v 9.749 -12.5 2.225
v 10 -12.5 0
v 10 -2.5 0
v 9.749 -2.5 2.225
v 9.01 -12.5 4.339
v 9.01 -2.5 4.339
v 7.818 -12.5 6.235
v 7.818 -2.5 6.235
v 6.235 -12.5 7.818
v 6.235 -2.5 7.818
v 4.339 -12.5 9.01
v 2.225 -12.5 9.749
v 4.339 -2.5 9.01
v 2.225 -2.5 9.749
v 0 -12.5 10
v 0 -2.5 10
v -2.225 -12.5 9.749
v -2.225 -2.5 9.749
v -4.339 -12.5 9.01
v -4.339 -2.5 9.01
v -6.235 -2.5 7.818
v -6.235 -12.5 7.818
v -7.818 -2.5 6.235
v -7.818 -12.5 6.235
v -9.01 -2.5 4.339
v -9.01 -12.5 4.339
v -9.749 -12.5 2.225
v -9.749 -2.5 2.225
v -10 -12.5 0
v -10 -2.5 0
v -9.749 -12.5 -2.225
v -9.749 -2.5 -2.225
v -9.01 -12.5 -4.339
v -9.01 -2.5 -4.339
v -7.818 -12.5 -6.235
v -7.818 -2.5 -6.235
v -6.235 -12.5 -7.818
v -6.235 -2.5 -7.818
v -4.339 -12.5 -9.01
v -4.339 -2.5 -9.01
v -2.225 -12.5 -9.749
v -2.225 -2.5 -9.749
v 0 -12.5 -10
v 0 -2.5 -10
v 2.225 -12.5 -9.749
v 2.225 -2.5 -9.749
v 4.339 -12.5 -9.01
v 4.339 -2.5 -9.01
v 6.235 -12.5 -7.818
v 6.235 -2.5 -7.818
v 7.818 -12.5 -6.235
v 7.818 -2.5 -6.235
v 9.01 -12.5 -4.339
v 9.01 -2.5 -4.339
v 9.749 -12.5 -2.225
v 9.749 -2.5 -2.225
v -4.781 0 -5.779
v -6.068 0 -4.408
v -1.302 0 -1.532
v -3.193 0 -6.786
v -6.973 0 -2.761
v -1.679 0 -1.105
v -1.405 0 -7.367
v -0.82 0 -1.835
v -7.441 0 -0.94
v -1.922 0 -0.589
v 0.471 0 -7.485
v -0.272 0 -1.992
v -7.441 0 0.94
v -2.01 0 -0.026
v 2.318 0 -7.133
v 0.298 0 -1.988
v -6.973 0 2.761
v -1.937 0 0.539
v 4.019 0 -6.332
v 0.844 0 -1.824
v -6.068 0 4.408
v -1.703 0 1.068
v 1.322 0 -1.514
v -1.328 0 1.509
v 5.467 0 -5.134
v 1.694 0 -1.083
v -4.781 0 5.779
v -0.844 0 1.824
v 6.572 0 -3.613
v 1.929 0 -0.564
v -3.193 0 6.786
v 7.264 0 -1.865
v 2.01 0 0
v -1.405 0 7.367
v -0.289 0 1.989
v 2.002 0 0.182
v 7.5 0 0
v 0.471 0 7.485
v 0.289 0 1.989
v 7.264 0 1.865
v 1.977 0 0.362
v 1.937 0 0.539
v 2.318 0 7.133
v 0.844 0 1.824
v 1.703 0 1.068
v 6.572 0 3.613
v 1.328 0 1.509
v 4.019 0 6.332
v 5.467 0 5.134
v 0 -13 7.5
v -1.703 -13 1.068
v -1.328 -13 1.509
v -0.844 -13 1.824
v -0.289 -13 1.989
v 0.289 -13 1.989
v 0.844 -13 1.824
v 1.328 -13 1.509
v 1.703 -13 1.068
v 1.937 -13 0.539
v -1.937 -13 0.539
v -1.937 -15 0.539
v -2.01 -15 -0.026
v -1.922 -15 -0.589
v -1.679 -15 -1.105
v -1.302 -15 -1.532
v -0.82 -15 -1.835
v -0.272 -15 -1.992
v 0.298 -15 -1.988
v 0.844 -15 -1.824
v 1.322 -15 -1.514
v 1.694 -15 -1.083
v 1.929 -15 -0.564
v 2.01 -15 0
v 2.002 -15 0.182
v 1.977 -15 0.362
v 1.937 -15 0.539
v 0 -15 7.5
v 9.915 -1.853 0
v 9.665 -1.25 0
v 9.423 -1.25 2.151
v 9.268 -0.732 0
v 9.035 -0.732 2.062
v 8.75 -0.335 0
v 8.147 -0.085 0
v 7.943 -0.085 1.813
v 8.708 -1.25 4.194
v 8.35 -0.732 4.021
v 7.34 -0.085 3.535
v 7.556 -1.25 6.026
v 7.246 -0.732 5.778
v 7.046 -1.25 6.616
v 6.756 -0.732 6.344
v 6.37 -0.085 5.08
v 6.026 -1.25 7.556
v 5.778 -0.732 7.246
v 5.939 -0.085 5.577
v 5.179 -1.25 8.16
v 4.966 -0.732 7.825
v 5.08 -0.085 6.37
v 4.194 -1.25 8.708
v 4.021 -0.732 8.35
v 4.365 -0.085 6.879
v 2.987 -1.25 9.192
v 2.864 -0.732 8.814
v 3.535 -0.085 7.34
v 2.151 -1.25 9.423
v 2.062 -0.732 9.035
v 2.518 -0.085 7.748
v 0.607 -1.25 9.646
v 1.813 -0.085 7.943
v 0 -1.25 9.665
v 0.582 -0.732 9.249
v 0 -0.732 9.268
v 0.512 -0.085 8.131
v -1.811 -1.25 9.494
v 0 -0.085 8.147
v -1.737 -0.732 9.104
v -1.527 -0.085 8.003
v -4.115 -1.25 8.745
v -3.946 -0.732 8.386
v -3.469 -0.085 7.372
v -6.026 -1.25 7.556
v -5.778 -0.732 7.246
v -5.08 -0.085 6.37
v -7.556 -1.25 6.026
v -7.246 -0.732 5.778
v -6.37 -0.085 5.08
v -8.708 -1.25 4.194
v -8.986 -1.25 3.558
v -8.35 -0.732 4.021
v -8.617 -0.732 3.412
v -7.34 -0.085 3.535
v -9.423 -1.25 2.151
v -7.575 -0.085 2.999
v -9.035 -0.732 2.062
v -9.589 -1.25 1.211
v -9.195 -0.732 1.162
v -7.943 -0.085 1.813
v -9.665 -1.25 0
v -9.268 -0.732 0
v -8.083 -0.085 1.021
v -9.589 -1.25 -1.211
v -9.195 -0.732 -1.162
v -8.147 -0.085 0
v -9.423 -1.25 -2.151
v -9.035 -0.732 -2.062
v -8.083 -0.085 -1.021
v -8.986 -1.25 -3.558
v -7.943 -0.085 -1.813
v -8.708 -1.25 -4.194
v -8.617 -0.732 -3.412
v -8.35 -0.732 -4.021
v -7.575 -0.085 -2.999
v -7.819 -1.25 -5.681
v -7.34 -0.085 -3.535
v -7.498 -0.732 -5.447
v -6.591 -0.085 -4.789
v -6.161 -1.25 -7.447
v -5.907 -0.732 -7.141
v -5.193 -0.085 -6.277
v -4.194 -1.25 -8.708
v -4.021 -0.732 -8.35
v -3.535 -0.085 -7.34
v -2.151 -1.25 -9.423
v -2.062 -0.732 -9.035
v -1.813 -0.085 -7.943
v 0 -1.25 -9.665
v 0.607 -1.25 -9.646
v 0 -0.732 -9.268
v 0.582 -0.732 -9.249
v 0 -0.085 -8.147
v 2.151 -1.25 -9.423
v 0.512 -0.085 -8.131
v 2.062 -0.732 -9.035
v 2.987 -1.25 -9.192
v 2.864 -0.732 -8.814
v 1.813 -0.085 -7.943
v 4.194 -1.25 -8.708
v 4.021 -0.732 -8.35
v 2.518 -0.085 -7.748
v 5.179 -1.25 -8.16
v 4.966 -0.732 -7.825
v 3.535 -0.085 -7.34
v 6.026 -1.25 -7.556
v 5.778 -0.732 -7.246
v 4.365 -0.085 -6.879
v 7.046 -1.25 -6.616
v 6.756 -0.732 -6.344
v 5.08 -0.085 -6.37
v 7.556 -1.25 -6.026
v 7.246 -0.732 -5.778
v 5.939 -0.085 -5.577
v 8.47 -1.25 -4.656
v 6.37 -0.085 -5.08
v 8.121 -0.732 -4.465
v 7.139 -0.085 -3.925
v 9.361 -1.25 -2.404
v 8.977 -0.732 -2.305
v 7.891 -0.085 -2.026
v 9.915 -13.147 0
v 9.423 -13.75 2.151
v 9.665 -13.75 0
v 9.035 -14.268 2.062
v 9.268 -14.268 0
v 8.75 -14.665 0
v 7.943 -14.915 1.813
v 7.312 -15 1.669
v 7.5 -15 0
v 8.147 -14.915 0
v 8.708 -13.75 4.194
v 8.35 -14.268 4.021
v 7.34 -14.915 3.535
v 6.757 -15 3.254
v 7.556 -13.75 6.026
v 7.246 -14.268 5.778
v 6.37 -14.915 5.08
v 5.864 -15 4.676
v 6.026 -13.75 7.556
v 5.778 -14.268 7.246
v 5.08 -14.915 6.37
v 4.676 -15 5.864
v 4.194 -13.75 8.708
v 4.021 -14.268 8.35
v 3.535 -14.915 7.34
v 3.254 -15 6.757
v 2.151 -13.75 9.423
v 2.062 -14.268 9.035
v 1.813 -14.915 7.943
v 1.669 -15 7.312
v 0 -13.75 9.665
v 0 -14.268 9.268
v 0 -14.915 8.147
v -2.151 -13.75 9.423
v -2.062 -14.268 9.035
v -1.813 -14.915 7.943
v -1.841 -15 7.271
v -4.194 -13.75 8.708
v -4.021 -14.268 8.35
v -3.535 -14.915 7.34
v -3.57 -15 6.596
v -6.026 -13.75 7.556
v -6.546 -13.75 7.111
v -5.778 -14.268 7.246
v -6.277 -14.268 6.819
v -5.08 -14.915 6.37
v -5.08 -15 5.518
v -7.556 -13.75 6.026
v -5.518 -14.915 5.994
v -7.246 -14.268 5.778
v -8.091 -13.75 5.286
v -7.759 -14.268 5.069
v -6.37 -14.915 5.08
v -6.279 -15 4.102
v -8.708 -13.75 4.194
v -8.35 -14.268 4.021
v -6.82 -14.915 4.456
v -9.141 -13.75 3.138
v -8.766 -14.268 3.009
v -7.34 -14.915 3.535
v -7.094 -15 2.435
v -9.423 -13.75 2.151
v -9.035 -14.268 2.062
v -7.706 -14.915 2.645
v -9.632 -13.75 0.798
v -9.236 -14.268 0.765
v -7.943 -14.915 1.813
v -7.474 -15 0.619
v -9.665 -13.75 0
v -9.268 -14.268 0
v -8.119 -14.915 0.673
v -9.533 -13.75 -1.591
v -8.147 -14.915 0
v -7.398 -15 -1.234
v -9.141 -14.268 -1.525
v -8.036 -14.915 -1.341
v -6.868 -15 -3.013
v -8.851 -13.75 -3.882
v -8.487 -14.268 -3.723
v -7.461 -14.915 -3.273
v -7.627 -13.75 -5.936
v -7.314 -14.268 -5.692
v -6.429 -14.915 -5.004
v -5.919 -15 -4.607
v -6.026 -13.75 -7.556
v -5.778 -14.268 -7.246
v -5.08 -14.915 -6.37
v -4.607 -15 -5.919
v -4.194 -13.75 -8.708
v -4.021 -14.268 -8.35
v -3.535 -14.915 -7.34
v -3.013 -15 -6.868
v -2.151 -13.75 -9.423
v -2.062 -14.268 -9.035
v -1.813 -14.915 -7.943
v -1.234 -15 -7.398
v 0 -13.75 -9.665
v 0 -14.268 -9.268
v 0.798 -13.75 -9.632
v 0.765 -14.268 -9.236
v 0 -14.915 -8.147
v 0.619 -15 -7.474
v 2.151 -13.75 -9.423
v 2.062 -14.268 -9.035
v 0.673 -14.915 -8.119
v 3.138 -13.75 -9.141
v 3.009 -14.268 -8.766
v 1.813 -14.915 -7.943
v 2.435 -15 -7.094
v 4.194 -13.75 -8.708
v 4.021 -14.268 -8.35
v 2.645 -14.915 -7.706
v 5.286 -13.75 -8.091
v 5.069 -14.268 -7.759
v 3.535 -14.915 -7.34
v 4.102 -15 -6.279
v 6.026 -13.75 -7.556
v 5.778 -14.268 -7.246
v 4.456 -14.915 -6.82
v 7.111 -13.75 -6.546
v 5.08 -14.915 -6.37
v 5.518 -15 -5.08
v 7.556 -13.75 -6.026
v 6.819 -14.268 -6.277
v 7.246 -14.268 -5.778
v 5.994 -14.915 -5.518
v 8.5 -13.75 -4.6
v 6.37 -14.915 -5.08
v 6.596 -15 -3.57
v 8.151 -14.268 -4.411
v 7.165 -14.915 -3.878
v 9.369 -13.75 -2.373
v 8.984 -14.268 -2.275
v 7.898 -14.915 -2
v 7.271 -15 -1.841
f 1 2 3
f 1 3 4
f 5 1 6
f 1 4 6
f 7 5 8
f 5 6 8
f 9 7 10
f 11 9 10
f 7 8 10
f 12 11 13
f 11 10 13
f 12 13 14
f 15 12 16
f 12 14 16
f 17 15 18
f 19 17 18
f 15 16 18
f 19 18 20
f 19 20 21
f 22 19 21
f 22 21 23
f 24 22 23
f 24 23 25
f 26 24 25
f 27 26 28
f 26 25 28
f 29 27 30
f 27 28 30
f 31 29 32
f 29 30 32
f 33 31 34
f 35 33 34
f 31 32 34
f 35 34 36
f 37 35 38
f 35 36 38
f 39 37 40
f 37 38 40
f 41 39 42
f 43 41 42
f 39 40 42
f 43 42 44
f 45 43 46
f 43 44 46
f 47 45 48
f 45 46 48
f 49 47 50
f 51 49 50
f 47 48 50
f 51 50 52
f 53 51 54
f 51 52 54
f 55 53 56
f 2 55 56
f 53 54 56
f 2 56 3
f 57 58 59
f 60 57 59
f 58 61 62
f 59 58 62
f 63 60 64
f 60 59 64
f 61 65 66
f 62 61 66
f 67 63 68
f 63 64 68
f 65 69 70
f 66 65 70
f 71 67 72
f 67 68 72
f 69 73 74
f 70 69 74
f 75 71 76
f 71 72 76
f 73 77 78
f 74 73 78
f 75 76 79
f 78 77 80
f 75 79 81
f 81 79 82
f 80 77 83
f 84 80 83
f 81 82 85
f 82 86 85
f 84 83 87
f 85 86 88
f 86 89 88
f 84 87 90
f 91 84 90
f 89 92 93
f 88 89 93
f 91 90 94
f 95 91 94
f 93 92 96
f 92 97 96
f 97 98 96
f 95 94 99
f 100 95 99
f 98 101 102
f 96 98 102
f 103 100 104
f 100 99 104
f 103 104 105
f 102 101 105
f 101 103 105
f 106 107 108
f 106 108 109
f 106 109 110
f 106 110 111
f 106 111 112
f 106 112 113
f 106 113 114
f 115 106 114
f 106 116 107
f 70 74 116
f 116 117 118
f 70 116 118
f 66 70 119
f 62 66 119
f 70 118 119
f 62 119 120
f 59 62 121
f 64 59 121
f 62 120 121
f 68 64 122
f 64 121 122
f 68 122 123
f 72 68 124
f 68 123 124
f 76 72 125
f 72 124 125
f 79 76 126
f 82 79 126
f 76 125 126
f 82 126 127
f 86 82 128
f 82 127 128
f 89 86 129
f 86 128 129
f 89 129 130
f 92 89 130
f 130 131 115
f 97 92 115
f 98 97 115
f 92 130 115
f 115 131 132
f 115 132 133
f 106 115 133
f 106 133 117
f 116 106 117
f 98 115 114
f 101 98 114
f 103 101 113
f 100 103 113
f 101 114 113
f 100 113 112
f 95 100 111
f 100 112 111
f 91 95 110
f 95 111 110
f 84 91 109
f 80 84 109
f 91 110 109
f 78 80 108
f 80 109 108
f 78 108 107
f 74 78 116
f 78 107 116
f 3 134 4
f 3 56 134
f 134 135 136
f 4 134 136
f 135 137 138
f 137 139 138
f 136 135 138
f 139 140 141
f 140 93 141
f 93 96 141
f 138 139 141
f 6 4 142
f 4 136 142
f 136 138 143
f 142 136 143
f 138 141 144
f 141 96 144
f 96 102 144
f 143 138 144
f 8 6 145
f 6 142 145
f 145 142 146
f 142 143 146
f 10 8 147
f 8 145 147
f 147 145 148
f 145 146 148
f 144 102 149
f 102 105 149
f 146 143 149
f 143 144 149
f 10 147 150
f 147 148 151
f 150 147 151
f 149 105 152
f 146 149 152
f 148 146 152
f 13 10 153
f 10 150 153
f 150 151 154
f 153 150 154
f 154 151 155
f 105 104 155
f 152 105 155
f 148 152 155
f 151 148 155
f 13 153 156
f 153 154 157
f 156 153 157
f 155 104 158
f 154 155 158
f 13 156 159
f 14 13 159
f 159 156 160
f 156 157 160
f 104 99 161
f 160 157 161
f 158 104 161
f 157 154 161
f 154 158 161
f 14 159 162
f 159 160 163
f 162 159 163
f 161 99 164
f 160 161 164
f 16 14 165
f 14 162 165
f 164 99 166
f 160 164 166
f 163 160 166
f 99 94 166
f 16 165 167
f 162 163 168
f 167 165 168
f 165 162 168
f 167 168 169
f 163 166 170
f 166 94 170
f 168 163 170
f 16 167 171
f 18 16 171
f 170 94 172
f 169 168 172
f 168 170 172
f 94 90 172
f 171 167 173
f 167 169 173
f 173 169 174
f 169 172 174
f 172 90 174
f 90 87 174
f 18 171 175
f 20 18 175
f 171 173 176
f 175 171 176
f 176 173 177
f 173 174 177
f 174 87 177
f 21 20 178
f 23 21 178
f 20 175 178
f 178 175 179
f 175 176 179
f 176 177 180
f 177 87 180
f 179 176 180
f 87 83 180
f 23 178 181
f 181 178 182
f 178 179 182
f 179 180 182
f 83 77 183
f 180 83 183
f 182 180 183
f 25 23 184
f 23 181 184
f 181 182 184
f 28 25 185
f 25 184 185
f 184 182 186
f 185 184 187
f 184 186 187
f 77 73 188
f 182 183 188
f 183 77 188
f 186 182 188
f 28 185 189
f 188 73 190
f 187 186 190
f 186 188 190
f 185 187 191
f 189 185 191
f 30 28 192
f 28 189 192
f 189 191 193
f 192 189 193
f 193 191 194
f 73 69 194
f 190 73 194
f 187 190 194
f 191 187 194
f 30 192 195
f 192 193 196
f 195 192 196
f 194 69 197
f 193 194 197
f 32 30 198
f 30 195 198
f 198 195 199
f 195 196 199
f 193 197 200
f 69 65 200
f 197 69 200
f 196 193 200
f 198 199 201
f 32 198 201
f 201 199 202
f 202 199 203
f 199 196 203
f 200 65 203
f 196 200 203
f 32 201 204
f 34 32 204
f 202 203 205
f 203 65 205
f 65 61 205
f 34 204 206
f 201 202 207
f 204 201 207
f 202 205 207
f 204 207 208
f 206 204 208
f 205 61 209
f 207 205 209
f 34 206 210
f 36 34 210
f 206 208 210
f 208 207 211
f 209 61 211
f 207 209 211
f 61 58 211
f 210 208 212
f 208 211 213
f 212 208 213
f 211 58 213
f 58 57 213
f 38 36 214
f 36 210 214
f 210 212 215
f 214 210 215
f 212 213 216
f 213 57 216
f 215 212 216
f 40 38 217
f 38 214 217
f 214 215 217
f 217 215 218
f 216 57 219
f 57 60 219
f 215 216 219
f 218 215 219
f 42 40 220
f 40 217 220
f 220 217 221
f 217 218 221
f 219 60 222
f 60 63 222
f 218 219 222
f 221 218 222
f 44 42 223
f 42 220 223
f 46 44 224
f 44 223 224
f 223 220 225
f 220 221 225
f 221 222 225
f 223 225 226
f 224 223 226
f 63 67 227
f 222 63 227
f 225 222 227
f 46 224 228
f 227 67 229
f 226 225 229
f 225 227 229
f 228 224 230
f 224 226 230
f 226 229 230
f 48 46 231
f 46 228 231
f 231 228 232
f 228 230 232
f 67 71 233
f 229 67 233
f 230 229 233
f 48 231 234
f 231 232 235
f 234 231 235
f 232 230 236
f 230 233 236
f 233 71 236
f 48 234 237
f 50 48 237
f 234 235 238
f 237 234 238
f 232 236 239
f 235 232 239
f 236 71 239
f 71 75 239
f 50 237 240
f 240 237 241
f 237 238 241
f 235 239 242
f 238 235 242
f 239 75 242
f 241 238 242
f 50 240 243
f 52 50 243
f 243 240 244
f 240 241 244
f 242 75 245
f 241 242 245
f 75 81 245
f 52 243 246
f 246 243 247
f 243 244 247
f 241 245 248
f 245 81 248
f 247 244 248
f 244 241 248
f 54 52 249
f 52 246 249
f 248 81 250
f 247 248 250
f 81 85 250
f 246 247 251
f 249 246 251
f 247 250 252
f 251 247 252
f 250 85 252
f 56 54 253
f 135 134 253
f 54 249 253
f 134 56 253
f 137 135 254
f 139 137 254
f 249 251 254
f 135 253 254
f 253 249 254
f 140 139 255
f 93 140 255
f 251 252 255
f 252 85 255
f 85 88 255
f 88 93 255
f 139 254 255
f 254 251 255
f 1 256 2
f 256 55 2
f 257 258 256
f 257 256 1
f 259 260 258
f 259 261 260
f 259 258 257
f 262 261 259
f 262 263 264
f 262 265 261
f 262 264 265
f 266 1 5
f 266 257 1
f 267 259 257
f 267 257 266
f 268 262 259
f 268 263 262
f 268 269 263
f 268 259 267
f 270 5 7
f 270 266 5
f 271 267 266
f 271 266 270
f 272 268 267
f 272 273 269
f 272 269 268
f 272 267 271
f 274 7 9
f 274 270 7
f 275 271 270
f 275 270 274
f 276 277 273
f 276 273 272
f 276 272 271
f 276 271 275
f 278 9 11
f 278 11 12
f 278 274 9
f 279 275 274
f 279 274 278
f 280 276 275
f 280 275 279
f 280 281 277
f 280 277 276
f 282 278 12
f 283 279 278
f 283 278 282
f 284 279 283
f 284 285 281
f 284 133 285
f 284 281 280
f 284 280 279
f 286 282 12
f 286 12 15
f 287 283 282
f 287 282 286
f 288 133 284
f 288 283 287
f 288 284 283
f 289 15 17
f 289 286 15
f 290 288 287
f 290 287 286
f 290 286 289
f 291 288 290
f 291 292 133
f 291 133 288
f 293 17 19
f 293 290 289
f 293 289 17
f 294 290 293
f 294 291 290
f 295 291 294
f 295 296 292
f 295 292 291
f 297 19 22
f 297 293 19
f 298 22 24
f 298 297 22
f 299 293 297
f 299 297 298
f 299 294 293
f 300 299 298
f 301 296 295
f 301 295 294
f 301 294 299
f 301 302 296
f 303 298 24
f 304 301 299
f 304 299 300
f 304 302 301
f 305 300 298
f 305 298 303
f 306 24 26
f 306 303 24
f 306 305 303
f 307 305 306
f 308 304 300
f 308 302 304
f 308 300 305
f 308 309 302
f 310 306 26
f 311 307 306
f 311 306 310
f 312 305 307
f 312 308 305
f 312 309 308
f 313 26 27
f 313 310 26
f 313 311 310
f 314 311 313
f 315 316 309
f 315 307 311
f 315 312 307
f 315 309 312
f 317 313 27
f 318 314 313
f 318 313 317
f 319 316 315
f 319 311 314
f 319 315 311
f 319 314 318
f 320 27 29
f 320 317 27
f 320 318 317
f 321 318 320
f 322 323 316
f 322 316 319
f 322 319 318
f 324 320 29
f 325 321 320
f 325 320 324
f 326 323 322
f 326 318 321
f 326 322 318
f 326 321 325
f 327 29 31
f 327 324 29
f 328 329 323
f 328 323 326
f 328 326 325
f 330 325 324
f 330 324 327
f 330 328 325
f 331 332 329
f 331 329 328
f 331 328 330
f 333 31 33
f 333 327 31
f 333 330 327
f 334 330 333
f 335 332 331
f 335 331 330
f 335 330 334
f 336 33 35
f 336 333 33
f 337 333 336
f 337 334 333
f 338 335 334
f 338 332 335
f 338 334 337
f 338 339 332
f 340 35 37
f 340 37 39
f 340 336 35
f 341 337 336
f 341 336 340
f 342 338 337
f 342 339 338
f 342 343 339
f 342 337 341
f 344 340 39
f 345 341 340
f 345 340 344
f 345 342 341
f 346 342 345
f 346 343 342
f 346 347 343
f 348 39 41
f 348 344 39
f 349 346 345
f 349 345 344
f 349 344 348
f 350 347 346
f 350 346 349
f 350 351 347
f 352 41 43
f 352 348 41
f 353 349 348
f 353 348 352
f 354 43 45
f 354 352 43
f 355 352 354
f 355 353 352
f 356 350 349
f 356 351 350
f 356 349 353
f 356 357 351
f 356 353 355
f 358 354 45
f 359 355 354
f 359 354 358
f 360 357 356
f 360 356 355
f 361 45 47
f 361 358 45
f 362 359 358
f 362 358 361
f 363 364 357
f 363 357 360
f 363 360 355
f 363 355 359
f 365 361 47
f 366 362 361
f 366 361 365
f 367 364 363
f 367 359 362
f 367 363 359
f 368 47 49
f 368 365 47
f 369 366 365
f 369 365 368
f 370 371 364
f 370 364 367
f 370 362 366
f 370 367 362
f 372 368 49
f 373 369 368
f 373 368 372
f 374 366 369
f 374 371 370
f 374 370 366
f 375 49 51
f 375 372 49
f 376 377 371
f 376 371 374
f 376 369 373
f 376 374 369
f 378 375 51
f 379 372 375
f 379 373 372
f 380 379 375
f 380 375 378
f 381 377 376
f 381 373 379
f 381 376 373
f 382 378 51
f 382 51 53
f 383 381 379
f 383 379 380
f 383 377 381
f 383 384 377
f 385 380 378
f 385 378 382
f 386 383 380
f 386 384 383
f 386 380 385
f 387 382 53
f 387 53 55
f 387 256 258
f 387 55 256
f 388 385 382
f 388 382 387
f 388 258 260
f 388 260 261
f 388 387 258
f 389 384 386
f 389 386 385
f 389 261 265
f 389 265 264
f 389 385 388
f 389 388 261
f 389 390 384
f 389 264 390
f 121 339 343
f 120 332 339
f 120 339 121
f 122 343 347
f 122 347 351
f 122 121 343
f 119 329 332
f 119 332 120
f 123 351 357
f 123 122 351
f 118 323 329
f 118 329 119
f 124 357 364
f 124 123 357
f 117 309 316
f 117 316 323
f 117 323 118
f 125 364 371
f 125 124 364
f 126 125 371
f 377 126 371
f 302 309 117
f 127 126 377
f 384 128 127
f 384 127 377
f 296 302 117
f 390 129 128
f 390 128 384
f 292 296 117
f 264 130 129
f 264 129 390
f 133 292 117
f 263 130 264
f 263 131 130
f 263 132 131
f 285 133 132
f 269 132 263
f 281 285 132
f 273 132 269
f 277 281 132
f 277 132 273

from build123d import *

# Parameters (mm, degrees)
F0_R     = 10
F0_R_2   = 9
F1_DEPTH = 15
F2_R     = 2.5
F4_DEPTH = 50
F5_DEPTH = 2


with BuildPart() as f1:
    # F0 (on Front) → F1 (new body)
    with BuildSketch(Plane.XZ):
        Circle(F0_R)
        Circle(F0_R_2, mode=Mode.SUBTRACT)
        Circle(F0_R_2)
    extrude(amount=F1_DEPTH)

    # F2
    f2_edges = [f1.edges().sort_by_distance(p)[0] for p in [
        (-10, -15, 0),
        (-10, 0, 0),
    ]]
    fillet(f2_edges, radius=F2_R)

    # F3 (on face) → F4 (cut)
    with BuildSketch(Plane.XZ.offset(15)):
        with BuildLine():
            ThreePointArc((-1.936537, 0.538719), (-0.271857, -1.991604), (2.010073, 0))
            ThreePointArc((2.010073, 0), (1.991604, 0.271857), (1.936537, 0.538719))
            ThreePointArc((1.936537, 0.538719), (0, 2.010073), (-1.936537, 0.538719))
        make_face()
    extrude(amount=-F4_DEPTH, mode=Mode.SUBTRACT)

    # F3 (on face) → F5 (cut)
    with BuildSketch(Plane.XZ.offset(15)):
        with BuildLine():
            ThreePointArc((-1.936537, 0.538719), (0, 2.010073), (1.936537, 0.538719))
            Line((1.936537, 0.538719), (0, 7.5))
            Line((0, 7.5), (-1.936537, 0.538719))
        make_face()
    extrude(amount=-F5_DEPTH, mode=Mode.SUBTRACT)


solid = f1.part
